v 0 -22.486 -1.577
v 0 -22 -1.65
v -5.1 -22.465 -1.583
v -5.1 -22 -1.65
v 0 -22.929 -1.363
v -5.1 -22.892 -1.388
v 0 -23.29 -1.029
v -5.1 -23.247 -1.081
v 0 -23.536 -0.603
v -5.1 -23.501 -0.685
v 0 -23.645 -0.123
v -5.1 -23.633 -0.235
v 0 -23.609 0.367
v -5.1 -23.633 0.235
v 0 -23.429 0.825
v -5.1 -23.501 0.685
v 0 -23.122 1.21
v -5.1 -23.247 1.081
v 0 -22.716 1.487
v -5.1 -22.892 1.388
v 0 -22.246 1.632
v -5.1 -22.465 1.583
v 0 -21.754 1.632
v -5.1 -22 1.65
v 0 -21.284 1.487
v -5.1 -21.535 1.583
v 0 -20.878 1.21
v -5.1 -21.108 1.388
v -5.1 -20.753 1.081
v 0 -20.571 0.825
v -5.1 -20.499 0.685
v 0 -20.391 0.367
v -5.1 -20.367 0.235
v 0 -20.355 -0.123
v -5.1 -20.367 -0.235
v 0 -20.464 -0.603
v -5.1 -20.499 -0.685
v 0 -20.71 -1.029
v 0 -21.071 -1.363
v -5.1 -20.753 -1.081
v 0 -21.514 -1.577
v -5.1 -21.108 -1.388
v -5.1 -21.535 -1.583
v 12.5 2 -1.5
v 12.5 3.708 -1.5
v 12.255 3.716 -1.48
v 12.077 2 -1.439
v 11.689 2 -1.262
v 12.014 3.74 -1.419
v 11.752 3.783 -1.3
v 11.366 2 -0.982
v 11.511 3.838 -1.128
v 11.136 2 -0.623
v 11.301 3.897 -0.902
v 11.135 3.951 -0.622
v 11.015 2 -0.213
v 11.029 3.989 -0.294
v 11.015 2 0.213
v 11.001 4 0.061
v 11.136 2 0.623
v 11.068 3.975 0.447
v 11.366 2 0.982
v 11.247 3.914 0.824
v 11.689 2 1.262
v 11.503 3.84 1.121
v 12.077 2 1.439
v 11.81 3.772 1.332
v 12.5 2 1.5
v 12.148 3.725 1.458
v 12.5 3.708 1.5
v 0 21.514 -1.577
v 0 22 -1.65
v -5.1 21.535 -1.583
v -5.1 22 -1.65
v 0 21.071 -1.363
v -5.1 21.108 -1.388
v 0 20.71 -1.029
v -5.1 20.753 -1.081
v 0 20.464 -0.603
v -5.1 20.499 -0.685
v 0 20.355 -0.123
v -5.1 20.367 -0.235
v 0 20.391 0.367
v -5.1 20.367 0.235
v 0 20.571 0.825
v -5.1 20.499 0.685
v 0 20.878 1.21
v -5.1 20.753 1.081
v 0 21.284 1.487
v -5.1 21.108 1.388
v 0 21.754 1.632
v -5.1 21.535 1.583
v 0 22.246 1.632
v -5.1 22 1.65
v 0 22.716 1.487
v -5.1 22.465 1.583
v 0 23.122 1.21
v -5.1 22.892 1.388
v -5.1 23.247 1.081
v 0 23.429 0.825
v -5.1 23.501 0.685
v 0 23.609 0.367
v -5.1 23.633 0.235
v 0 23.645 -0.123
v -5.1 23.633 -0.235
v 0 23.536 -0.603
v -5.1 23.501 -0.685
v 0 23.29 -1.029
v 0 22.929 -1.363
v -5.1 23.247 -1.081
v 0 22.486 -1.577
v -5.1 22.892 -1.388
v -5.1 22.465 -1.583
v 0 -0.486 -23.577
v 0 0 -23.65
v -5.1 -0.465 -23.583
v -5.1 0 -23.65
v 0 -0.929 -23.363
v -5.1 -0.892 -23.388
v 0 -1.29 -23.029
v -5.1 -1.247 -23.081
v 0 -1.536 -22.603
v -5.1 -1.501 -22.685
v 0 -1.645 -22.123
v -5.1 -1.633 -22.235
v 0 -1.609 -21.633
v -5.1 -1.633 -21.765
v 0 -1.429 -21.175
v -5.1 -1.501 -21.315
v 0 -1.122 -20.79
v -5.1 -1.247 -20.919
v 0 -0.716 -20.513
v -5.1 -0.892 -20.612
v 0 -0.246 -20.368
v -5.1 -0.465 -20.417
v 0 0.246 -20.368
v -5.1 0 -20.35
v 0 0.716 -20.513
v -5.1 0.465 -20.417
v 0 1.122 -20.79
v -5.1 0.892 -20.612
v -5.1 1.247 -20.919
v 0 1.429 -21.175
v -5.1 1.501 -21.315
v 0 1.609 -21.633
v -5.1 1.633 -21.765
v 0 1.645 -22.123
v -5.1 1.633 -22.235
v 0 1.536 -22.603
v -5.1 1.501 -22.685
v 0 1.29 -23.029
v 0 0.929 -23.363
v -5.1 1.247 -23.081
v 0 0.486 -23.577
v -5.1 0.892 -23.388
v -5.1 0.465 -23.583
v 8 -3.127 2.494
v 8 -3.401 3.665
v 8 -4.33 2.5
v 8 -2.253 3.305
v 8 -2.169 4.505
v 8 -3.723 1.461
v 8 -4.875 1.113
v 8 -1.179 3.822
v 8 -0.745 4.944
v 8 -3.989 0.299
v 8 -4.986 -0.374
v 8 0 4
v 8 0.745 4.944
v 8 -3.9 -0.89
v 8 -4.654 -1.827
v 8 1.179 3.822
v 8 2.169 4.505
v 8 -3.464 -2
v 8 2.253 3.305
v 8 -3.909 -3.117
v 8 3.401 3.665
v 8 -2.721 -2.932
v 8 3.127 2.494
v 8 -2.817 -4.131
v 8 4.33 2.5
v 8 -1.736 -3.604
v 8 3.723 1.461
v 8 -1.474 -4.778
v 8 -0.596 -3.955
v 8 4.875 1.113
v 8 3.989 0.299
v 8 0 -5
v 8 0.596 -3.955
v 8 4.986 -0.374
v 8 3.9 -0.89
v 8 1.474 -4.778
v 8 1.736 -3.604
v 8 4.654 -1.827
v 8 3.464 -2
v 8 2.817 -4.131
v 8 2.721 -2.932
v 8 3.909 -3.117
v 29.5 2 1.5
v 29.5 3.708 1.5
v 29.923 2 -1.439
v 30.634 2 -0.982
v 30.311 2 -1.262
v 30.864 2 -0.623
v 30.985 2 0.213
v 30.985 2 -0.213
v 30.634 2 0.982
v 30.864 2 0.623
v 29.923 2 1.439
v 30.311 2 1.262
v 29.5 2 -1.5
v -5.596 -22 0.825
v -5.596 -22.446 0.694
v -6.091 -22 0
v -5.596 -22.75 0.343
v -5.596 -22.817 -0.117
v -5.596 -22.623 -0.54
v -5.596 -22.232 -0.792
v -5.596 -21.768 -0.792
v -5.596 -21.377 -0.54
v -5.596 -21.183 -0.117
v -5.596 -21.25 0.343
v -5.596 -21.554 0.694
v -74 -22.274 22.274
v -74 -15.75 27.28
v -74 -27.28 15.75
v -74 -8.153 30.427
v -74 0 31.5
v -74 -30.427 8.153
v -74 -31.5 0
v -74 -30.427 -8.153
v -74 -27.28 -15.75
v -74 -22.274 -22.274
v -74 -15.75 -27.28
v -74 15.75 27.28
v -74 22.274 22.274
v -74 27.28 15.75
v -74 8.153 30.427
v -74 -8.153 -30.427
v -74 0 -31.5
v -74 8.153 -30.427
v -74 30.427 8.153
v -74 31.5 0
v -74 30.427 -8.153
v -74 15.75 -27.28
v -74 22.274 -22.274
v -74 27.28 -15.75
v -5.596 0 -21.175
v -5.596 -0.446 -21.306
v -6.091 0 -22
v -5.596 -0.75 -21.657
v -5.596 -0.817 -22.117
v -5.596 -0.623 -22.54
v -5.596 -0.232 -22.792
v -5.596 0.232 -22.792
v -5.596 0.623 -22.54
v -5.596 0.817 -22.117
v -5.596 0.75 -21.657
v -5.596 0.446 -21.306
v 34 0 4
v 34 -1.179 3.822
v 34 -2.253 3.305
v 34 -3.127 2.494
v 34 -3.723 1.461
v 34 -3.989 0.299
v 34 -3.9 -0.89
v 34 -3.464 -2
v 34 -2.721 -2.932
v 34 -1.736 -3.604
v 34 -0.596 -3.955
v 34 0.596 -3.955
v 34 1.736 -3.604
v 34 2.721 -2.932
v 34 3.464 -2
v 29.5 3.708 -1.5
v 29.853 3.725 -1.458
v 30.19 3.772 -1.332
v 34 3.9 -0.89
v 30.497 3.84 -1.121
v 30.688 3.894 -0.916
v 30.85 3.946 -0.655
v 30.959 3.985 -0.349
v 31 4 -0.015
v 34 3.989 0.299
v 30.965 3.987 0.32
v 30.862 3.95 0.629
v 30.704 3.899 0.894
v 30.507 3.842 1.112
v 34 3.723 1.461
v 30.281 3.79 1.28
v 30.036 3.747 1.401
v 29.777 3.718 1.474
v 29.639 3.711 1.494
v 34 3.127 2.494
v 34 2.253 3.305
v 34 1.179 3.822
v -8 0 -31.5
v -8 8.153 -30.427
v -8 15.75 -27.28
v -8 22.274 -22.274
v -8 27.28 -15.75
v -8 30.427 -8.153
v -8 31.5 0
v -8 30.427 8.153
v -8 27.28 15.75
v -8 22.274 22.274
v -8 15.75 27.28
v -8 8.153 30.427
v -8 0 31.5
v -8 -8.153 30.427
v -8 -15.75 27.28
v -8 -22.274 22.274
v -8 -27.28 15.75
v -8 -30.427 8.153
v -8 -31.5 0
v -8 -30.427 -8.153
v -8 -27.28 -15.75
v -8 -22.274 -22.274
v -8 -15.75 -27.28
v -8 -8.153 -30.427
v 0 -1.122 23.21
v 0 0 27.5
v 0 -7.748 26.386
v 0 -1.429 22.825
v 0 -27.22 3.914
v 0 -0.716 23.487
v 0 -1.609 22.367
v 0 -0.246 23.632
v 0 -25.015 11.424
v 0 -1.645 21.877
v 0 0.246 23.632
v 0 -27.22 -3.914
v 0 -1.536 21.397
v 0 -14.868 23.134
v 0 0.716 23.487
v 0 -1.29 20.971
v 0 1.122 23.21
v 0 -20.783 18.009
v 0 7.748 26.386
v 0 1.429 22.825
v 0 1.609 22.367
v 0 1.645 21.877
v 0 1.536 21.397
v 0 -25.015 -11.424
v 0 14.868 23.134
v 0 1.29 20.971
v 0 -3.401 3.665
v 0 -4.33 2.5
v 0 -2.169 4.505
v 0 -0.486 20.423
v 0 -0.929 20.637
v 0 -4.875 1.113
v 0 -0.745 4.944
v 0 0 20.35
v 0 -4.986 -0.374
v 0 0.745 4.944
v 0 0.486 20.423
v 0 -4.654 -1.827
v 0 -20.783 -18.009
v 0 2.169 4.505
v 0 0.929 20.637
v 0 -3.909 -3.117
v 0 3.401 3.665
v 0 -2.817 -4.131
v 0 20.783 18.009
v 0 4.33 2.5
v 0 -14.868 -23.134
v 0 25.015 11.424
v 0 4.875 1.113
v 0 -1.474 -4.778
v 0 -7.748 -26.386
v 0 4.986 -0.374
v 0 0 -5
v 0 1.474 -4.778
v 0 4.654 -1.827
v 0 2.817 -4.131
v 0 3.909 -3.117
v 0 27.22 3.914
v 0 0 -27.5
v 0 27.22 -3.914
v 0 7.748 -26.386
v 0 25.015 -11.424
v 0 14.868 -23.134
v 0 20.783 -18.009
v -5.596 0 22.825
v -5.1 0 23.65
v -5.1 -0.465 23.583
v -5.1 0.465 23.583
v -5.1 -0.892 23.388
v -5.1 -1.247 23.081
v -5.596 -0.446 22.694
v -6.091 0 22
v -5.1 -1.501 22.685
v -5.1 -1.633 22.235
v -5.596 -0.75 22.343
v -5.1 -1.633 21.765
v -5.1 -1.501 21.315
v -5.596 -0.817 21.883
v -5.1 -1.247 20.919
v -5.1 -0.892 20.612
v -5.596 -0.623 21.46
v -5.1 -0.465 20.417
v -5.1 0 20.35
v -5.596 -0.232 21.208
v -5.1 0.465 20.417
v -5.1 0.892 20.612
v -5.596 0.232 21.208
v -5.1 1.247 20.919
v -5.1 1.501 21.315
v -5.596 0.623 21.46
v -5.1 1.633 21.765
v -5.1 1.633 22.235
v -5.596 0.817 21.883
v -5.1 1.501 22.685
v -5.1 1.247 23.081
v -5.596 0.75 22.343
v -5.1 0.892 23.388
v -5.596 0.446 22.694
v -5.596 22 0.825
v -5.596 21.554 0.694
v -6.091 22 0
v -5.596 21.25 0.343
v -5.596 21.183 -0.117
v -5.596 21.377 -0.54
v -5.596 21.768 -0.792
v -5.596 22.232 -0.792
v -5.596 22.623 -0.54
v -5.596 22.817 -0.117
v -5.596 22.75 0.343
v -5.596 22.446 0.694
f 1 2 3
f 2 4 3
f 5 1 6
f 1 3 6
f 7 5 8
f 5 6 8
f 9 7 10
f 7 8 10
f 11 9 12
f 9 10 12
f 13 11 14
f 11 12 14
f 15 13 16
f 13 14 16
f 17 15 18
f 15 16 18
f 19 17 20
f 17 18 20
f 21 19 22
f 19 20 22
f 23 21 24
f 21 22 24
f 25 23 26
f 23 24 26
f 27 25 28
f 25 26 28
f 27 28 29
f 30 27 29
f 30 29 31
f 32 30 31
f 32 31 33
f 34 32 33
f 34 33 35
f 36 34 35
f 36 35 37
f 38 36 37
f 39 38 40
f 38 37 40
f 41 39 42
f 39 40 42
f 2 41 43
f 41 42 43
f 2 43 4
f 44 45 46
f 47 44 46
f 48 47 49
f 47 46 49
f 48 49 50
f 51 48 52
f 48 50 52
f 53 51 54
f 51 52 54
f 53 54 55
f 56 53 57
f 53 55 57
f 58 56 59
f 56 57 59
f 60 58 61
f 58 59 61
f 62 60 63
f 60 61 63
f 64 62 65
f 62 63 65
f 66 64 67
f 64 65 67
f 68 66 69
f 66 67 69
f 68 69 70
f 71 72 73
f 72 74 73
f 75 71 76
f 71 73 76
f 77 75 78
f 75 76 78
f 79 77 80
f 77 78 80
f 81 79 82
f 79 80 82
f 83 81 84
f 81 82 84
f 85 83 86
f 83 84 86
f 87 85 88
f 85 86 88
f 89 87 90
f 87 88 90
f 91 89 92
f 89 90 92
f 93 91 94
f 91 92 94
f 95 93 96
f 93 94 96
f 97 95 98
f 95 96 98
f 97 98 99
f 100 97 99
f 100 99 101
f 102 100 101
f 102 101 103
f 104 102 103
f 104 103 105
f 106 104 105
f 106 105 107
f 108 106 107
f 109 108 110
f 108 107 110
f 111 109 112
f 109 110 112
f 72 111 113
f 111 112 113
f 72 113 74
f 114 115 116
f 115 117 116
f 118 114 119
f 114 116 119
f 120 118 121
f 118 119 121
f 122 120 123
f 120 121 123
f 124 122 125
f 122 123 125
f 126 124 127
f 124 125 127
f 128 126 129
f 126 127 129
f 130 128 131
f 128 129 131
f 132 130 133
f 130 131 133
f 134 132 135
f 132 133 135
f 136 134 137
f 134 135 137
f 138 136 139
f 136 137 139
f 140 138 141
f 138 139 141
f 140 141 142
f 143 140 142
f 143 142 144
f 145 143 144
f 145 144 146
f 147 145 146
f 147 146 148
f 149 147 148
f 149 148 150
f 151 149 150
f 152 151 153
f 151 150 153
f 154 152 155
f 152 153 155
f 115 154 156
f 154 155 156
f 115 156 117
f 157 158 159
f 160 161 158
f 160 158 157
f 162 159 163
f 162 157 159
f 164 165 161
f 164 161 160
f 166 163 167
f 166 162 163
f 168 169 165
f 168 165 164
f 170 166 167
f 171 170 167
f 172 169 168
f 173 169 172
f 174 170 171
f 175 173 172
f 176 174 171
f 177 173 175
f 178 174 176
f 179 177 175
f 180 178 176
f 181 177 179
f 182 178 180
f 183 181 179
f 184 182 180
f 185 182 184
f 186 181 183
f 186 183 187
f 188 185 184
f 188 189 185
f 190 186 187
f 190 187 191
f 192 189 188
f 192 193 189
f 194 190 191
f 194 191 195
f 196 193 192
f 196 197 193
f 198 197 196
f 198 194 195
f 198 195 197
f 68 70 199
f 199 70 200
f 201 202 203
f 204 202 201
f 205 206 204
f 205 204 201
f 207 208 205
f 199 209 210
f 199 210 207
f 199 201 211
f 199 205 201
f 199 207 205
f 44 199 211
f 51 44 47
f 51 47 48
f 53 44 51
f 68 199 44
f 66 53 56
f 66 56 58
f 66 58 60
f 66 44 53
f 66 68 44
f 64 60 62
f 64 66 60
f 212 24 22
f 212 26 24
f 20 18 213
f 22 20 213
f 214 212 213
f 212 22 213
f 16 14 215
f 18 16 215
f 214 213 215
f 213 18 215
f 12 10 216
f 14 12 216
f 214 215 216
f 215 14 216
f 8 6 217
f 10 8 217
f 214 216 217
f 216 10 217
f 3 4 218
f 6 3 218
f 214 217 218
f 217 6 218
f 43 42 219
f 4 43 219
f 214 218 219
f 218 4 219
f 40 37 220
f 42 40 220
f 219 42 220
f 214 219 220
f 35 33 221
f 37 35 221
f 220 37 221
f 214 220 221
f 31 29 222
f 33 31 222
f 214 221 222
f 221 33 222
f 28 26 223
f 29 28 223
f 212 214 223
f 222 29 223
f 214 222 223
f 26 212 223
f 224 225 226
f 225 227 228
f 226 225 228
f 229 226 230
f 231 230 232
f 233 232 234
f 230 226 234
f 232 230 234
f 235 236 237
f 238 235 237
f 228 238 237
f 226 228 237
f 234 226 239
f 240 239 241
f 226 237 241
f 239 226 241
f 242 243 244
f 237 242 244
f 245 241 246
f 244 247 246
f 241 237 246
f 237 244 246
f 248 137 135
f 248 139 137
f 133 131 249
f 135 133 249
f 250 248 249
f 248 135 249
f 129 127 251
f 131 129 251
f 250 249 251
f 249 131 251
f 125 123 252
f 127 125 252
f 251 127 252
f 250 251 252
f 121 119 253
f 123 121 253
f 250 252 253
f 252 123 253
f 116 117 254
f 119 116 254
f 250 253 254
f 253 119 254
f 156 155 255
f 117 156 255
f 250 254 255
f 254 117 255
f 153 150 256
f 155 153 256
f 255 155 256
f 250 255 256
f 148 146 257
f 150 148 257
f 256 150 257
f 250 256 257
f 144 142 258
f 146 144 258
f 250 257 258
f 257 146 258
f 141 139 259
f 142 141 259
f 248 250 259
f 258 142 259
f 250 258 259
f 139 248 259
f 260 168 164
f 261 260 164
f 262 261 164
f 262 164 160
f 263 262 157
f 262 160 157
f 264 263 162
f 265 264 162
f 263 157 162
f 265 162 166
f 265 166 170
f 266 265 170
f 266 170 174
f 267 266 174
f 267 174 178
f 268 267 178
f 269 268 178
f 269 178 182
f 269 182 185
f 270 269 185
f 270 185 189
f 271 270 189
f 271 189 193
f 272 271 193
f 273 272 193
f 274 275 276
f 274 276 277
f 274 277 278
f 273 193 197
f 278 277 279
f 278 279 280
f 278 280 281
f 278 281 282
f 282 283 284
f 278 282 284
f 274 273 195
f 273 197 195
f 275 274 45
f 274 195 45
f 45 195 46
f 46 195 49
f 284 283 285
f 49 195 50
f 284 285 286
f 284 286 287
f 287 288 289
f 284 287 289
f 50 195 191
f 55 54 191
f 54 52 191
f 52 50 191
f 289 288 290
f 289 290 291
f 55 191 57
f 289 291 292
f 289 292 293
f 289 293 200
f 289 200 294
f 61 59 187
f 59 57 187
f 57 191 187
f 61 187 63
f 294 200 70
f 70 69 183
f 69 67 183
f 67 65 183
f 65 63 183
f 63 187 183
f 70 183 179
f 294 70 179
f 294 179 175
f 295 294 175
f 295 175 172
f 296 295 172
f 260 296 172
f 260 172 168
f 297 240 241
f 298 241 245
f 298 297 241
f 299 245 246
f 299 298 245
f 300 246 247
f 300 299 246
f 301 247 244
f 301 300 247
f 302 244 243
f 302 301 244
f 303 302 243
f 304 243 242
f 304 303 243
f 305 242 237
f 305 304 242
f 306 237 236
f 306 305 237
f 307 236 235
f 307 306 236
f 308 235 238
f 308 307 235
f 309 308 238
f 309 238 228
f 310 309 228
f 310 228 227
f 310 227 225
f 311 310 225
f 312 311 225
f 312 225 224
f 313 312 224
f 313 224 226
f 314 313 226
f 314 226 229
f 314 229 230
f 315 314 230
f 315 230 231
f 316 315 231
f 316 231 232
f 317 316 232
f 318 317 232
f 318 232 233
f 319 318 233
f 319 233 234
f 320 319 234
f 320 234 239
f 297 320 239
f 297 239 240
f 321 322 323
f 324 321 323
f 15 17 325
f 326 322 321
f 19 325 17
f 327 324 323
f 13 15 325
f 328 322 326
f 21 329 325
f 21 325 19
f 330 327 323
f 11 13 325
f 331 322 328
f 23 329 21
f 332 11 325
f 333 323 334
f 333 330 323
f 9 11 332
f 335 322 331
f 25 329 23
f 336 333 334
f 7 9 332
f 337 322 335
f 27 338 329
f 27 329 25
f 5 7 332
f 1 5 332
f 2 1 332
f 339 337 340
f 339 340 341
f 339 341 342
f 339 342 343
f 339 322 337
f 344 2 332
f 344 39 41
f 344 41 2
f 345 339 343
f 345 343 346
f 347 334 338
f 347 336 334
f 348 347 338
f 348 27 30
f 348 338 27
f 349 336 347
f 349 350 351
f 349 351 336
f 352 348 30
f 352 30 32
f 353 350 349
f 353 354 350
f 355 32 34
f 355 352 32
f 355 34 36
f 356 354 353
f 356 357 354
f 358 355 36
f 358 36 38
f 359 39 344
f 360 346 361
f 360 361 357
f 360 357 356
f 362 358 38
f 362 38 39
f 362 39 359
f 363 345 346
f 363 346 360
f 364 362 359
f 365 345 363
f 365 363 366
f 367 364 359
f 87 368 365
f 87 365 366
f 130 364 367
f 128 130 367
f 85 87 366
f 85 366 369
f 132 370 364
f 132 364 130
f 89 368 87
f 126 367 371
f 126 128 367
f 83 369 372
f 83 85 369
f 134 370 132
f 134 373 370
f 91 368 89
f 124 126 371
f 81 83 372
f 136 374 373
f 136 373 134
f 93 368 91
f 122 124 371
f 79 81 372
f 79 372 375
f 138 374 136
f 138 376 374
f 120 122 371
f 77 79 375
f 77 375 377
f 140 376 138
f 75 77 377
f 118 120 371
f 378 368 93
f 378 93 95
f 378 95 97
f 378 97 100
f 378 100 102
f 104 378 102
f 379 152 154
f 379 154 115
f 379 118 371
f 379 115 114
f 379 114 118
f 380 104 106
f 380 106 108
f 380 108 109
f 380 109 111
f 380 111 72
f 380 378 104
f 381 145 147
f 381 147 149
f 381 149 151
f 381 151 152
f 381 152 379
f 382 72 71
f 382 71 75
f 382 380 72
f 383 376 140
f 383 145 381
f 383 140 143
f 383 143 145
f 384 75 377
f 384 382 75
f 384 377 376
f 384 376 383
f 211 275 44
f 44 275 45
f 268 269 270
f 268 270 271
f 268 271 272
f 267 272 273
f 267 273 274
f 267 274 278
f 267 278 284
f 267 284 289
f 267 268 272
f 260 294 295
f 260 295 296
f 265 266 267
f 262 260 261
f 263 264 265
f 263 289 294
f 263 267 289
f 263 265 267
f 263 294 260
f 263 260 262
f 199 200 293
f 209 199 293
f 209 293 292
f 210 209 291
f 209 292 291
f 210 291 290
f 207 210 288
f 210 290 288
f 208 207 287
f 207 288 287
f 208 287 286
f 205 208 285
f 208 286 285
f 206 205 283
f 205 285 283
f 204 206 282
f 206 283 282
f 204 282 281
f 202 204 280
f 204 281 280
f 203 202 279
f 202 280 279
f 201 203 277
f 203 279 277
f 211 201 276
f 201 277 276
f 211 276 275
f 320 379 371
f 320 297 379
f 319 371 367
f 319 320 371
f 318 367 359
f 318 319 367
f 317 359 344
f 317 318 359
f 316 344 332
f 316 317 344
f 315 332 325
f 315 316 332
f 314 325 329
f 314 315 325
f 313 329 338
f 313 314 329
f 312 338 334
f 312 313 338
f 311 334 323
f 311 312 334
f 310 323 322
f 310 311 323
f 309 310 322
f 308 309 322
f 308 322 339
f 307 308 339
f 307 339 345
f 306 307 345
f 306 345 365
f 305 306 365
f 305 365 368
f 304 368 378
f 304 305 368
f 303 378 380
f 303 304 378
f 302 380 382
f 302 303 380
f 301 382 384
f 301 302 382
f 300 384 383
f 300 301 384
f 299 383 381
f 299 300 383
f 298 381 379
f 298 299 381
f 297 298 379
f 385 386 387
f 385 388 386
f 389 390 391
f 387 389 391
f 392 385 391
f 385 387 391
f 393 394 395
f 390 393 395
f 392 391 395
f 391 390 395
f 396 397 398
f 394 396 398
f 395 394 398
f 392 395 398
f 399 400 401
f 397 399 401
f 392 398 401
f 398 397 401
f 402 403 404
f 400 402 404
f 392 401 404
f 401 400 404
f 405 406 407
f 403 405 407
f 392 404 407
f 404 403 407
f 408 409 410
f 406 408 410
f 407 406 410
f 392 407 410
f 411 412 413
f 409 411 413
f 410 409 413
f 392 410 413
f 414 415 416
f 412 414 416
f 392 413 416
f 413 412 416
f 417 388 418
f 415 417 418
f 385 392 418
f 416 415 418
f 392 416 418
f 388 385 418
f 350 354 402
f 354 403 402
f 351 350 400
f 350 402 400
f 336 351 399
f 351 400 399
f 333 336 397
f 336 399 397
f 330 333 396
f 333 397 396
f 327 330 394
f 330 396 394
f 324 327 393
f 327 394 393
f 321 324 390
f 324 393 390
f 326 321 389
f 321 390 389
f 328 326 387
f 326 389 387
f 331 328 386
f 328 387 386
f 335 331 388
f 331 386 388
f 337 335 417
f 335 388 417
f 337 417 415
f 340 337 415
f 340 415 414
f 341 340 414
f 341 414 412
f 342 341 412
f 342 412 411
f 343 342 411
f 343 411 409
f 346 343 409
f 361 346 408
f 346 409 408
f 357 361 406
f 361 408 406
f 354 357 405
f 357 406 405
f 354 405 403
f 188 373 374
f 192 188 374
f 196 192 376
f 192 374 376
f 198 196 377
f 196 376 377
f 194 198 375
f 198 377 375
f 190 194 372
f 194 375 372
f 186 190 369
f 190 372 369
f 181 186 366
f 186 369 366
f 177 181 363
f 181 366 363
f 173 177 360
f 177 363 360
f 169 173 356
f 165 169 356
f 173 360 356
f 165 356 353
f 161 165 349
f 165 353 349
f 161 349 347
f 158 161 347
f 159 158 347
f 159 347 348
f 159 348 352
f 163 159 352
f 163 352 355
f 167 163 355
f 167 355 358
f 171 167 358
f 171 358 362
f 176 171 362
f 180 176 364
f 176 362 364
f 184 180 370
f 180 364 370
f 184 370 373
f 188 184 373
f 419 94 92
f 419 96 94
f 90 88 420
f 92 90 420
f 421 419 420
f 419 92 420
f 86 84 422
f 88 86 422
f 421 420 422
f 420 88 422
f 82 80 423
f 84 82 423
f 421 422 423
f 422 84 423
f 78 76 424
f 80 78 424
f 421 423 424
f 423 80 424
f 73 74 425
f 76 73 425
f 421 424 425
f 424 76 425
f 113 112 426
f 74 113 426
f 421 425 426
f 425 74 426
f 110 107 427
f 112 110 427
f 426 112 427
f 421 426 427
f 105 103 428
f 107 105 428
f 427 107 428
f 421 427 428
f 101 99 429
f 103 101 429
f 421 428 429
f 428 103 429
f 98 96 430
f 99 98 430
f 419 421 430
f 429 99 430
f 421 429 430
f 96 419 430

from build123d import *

# Parameters (mm, degrees)
SKETCH_1_R          = 31.5
EXTRUDE_1_DEPTH     = 74
SKETCH_2_R          = 5
EXTRUDE_2_DEPTH     = 8
SKETCH_3_R          = 4
EXTRUDE_3_DEPTH     = 26
CUT_EXTRUDE_1_DEPTH = 2
M4X0_7_1_D          = 3.3
M4X0_7_1_DEPTH      = 5.1
M4X0_7_1_TIP        = 0.991420021


with BuildPart() as part:
    # 草图1 → 凸台-拉伸1 (new body)
    with BuildSketch(Plane(origin=(0, 0, 0), x_dir=(0, 0, -1), z_dir=(1, 0, 0))):
        Circle(SKETCH_1_R)
    extrude(amount=-EXTRUDE_1_DEPTH)

    # 草图2 → 凸台-拉伸2 (add)
    with BuildSketch(Plane(origin=(0, 0, 0), x_dir=(0, 0, -1), z_dir=(1, 0, 0))):
        Circle(SKETCH_2_R)
    extrude(amount=EXTRUDE_2_DEPTH)

    # 草图3 → 凸台-拉伸3 (add)
    with BuildSketch(Plane(origin=(8, 0, 0), x_dir=(0, 0, -1), z_dir=(1, 0, 0))):
        with Locations(Location((0, 0, 0), (0, 0, 180))):
            Circle(SKETCH_3_R)
    extrude(amount=EXTRUDE_3_DEPTH)

    # Sketch 3D_1 → 切除-拉伸1 (cut)
    with BuildSketch(Plane(origin=(12.5, 4, 1.5), x_dir=(0.9847835588179368, 0, -0.17378533390904766), z_dir=(0, -1, 0))):
        with BuildLine():
            Line((0, 0), (16.7413205, 2.954350676))
            ThreePointArc((16.7413205, 2.954350676), (18.479173839, 1.737853339), (17.262676502, 0))
            Line((17.262676502, 0), (0.521356002, -2.954350676))
            ThreePointArc((0.521356002, -2.954350676), (-1.216497337, -1.737853339), (0, 0))
        make_face()
    extrude(amount=CUT_EXTRUDE_1_DEPTH, mode=Mode.SUBTRACT)

    # M4x0.7 螺纹孔1
    with Locations(Plane(origin=(0, 22, 0), x_dir=(0, 0, 1), z_dir=(1, 0, 0))):
        with Locations((0, 0), (-22, 22), (0, 44), (22, 22)):
            Hole(M4X0_7_1_D / 2, depth=M4X0_7_1_DEPTH)
            with Locations((0, 0, -(M4X0_7_1_DEPTH + M4X0_7_1_TIP / 2))):  # 118° drill point
                Cone(0, M4X0_7_1_D / 2, M4X0_7_1_TIP, mode=Mode.SUBTRACT)

    # 草图9 → 切除-旋转1 (revolve, cut)
    with BuildSketch(Plane.XY, mode=Mode.PRIVATE) as cut_revolve_1_sk:
        Polygon((0, 31.5), (0, 27.5), (-8, 31.5), align=None)
    revolve(cut_revolve_1_sk.sketch.rotate(Axis((0, 0, 0), (-1, 0, 0)), 90), axis=Axis((0, 0, 0), (-1, 0, 0)), mode=Mode.SUBTRACT)


solid = part.part
